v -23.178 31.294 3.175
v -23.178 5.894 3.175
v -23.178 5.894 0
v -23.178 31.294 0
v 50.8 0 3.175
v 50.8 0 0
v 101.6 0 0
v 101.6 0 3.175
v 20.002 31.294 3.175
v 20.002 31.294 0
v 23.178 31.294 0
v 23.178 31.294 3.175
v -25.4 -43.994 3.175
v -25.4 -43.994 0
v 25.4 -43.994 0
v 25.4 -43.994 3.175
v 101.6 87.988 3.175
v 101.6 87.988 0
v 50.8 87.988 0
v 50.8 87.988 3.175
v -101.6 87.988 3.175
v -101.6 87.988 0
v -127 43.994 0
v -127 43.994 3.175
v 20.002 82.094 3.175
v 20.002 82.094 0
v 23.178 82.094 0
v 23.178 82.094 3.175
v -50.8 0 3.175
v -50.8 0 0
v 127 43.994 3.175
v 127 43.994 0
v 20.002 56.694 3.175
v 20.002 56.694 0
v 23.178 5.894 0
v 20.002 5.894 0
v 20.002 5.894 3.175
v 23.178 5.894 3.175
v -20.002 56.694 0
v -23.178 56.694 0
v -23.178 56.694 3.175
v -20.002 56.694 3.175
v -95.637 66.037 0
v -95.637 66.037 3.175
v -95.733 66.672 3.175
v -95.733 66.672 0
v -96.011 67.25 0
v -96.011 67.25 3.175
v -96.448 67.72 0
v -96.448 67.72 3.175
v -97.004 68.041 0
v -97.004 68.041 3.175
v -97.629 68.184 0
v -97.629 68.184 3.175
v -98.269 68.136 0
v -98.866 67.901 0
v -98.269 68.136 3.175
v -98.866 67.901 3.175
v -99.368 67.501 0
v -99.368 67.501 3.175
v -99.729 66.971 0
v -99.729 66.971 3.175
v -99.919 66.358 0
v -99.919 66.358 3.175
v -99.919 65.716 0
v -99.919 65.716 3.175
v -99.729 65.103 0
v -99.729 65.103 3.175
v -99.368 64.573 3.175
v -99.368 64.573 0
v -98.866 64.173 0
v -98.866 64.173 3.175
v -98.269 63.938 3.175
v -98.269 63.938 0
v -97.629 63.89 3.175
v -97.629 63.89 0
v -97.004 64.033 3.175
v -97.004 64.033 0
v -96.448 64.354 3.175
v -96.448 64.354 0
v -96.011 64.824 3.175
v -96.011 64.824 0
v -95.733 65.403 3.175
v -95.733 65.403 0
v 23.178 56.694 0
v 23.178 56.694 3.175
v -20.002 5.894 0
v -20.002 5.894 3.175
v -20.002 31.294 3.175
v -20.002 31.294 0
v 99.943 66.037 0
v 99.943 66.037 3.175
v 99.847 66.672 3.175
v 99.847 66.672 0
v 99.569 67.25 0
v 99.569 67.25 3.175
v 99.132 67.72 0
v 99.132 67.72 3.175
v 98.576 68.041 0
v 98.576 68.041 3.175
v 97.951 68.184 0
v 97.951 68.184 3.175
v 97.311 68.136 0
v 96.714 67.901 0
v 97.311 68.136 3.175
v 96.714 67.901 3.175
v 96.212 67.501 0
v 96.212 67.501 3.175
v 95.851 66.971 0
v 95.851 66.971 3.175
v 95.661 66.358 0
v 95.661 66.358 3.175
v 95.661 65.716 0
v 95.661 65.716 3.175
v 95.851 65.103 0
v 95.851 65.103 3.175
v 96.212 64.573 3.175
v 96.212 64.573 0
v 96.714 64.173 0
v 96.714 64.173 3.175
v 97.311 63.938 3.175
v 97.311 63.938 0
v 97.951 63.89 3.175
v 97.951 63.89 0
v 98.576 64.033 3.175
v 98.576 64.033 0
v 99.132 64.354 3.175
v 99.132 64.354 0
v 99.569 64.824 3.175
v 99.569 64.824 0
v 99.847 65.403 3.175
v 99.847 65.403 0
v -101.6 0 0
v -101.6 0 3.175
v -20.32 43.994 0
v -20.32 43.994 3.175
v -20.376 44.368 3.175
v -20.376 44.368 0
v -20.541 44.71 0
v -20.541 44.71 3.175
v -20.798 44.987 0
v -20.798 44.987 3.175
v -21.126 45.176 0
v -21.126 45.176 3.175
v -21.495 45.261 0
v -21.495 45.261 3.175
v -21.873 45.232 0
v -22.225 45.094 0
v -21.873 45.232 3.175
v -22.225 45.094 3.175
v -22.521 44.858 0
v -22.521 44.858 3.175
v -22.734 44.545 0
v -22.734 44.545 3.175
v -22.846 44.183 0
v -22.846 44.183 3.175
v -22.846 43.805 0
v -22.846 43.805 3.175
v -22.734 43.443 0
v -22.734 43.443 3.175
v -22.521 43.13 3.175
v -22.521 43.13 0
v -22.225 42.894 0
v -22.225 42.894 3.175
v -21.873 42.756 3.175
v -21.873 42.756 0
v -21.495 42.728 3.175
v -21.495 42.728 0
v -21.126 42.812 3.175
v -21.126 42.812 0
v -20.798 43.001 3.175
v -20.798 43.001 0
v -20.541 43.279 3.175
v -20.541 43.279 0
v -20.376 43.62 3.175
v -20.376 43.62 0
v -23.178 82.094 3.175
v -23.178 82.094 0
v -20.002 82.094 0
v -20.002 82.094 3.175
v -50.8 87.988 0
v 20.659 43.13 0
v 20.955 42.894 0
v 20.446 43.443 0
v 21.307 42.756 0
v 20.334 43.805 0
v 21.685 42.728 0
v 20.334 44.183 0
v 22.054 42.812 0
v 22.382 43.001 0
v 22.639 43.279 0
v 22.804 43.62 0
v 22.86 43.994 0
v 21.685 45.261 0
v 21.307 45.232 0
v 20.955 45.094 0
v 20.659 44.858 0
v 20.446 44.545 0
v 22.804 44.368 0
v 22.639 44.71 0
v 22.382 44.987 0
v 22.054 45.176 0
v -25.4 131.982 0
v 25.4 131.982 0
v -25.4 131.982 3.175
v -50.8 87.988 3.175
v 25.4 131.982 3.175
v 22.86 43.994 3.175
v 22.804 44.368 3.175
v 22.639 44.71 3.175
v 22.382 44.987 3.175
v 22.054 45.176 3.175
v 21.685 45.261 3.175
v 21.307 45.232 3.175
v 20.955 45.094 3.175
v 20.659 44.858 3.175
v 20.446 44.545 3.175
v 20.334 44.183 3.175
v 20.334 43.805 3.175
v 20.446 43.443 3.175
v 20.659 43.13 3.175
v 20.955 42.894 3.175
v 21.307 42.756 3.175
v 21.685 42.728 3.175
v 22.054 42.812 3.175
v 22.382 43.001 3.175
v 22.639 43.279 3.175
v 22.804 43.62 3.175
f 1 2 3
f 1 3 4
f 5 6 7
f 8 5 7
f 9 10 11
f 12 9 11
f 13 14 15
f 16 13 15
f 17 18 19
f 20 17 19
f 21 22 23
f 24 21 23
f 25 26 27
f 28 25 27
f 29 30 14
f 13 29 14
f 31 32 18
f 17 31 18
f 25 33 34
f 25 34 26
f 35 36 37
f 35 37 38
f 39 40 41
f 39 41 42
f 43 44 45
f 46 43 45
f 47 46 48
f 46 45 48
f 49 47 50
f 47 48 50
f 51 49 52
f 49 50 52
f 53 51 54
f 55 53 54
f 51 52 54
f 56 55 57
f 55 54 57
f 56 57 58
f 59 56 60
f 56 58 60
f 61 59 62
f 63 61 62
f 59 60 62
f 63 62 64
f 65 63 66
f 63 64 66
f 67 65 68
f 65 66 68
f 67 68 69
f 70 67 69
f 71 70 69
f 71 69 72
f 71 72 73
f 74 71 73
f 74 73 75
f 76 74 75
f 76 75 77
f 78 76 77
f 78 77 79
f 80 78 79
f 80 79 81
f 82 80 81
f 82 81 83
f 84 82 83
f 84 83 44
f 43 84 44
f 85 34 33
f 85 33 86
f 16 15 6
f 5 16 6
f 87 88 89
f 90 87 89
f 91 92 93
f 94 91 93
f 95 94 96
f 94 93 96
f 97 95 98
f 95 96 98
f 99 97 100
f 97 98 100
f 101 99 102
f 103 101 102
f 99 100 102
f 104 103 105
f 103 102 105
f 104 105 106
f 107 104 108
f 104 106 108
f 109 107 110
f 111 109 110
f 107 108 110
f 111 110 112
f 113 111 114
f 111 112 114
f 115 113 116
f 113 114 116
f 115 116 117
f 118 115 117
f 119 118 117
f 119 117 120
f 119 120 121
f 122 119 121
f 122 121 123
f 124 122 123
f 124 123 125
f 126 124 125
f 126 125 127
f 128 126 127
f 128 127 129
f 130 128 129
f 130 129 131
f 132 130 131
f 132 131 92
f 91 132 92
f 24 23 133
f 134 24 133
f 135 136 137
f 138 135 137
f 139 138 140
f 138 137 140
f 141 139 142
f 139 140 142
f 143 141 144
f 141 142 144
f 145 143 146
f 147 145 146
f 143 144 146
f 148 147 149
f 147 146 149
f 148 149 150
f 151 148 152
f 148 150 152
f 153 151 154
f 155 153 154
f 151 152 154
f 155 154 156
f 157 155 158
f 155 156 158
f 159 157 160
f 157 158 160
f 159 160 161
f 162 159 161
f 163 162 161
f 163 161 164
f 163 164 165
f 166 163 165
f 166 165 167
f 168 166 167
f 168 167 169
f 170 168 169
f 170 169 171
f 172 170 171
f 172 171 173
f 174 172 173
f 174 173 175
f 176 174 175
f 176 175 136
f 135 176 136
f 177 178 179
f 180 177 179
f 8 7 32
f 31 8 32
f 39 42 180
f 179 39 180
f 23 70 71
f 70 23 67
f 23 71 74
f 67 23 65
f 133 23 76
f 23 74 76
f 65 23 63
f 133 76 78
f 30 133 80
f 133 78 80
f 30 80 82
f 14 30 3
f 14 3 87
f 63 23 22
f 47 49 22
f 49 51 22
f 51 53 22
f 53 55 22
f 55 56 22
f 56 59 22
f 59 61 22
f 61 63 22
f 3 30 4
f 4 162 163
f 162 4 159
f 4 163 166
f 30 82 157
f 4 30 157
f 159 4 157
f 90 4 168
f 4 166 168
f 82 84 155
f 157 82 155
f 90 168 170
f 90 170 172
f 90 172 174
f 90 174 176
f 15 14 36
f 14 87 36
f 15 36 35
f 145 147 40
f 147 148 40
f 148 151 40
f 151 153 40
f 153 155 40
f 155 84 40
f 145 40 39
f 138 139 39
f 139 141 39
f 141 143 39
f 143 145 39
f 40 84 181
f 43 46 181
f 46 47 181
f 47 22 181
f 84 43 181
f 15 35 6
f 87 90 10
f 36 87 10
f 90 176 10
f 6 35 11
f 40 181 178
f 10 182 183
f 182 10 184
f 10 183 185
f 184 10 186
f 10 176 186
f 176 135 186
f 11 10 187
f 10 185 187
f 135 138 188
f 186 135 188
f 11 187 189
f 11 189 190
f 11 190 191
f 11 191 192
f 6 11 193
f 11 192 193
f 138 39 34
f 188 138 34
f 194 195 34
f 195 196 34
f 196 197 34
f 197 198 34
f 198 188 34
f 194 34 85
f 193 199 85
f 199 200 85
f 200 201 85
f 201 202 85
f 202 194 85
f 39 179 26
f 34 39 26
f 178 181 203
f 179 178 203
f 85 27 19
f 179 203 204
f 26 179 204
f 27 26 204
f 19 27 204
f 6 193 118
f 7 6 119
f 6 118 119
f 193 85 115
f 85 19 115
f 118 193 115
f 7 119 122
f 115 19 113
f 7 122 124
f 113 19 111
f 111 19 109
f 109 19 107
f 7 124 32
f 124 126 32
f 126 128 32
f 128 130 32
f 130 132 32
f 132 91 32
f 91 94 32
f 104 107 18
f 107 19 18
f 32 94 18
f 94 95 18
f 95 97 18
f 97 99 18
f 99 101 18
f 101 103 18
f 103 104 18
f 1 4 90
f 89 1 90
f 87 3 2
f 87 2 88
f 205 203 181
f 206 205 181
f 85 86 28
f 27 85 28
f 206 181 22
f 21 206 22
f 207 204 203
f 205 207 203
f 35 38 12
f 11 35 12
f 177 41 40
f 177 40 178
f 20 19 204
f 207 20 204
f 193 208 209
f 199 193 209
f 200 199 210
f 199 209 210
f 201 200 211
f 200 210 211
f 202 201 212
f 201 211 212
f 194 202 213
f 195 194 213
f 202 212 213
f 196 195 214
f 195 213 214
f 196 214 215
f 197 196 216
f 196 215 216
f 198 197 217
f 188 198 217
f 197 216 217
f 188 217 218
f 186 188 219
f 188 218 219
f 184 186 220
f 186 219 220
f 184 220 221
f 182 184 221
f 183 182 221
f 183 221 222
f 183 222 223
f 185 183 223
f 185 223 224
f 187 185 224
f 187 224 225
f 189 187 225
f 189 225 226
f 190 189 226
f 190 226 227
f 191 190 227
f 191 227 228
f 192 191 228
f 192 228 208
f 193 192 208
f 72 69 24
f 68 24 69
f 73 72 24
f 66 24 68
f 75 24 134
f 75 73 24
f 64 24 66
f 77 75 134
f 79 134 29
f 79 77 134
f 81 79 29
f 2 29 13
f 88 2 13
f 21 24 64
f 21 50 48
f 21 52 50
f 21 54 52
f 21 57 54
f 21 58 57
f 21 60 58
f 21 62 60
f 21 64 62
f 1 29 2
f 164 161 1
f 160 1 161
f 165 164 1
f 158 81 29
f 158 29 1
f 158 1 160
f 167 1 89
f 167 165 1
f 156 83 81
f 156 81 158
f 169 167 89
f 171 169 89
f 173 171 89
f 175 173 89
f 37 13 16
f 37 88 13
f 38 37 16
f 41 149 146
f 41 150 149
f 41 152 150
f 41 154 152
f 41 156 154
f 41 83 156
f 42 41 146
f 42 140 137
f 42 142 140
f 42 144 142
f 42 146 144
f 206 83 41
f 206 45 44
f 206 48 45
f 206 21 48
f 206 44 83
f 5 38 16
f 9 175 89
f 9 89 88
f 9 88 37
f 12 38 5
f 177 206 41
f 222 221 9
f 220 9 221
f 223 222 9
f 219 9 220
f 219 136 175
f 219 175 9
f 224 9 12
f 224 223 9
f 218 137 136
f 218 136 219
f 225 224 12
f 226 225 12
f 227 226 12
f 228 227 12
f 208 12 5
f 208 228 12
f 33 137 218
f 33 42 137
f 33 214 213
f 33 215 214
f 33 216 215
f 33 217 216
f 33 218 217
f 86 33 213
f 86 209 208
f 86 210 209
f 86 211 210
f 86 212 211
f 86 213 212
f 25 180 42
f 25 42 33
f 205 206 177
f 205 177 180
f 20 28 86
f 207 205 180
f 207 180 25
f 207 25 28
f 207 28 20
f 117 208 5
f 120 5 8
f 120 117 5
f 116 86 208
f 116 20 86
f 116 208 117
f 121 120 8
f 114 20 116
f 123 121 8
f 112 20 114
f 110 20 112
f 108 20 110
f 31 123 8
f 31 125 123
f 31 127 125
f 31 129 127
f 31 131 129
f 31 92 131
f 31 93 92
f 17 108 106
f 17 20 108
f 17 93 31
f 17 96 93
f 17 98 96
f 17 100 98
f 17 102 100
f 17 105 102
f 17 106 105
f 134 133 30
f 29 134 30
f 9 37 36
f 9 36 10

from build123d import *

# Parameters (mm, degrees)
F1_DEPTH = 3.175
F2_W     = 3.175
F2_H     = 25.4
F3_DEPTH = 7.62
F2_R     = 1.27
F4_DEPTH = 7.62
F5_R     = 2.15265
F6_DEPTH = 25.4


# Not quite as in the source:
# - a length typed as a fraction of an inch, garbled in the dataset ("3 / 203.2 mm" for 3/8 in), is restored


with BuildPart() as f1:
    # F0 (on Top) → F1 (new body)
    with BuildSketch(Plane.XY):
        Polygon((-25.4, -43.9940905122), (25.4, -43.9940905122), (50.8, 0), (101.6, 0), (127, 43.9940905122), (101.6, 87.9881810245), (50.8, 87.9881810245), (25.4, 131.9822715367), (-25.4, 131.9822715367), (-50.8, 87.9881810245), (-101.6, 87.9881810245), (-127, 43.9940905122), (-101.6, 0), (-50.8, 0), align=None)
    extrude(amount=F1_DEPTH)

    # F2 (on face) → F3 (cut)
    with BuildSketch(Plane.XY.offset(3.175)):
        with Locations((-21.59, 69.3940905122)):
            Rectangle(F2_W, F2_H)
        with Locations((21.59, 69.3940905122)):
            Rectangle(F2_W, F2_H)
        with Locations((21.59, 18.5940905122)):
            Rectangle(F2_W, F2_H)
        with Locations((-21.59, 18.5940905122)):
            Rectangle(F2_W, F2_H)
    extrude(amount=-F3_DEPTH, mode=Mode.SUBTRACT)

    # F2 (on face) → F4 (cut)
    with BuildSketch(Plane.XY.offset(3.175)):
        with Locations((-21.59, 43.9940905122)):
            Circle(F2_R)
        with Locations((21.59, 43.9940905122)):
            Circle(F2_R)
    extrude(amount=-F4_DEPTH, mode=Mode.SUBTRACT)

    # F5 (on face) → F6 (cut)
    with BuildSketch(Plane.XY.offset(3.175)):
        with Locations((97.79, 66.0370998967)):
            Circle(F5_R)
        with Locations((-97.79, 66.0370998967)):
            Circle(F5_R)
    extrude(amount=-F6_DEPTH, mode=Mode.SUBTRACT)


solid = f1.part
